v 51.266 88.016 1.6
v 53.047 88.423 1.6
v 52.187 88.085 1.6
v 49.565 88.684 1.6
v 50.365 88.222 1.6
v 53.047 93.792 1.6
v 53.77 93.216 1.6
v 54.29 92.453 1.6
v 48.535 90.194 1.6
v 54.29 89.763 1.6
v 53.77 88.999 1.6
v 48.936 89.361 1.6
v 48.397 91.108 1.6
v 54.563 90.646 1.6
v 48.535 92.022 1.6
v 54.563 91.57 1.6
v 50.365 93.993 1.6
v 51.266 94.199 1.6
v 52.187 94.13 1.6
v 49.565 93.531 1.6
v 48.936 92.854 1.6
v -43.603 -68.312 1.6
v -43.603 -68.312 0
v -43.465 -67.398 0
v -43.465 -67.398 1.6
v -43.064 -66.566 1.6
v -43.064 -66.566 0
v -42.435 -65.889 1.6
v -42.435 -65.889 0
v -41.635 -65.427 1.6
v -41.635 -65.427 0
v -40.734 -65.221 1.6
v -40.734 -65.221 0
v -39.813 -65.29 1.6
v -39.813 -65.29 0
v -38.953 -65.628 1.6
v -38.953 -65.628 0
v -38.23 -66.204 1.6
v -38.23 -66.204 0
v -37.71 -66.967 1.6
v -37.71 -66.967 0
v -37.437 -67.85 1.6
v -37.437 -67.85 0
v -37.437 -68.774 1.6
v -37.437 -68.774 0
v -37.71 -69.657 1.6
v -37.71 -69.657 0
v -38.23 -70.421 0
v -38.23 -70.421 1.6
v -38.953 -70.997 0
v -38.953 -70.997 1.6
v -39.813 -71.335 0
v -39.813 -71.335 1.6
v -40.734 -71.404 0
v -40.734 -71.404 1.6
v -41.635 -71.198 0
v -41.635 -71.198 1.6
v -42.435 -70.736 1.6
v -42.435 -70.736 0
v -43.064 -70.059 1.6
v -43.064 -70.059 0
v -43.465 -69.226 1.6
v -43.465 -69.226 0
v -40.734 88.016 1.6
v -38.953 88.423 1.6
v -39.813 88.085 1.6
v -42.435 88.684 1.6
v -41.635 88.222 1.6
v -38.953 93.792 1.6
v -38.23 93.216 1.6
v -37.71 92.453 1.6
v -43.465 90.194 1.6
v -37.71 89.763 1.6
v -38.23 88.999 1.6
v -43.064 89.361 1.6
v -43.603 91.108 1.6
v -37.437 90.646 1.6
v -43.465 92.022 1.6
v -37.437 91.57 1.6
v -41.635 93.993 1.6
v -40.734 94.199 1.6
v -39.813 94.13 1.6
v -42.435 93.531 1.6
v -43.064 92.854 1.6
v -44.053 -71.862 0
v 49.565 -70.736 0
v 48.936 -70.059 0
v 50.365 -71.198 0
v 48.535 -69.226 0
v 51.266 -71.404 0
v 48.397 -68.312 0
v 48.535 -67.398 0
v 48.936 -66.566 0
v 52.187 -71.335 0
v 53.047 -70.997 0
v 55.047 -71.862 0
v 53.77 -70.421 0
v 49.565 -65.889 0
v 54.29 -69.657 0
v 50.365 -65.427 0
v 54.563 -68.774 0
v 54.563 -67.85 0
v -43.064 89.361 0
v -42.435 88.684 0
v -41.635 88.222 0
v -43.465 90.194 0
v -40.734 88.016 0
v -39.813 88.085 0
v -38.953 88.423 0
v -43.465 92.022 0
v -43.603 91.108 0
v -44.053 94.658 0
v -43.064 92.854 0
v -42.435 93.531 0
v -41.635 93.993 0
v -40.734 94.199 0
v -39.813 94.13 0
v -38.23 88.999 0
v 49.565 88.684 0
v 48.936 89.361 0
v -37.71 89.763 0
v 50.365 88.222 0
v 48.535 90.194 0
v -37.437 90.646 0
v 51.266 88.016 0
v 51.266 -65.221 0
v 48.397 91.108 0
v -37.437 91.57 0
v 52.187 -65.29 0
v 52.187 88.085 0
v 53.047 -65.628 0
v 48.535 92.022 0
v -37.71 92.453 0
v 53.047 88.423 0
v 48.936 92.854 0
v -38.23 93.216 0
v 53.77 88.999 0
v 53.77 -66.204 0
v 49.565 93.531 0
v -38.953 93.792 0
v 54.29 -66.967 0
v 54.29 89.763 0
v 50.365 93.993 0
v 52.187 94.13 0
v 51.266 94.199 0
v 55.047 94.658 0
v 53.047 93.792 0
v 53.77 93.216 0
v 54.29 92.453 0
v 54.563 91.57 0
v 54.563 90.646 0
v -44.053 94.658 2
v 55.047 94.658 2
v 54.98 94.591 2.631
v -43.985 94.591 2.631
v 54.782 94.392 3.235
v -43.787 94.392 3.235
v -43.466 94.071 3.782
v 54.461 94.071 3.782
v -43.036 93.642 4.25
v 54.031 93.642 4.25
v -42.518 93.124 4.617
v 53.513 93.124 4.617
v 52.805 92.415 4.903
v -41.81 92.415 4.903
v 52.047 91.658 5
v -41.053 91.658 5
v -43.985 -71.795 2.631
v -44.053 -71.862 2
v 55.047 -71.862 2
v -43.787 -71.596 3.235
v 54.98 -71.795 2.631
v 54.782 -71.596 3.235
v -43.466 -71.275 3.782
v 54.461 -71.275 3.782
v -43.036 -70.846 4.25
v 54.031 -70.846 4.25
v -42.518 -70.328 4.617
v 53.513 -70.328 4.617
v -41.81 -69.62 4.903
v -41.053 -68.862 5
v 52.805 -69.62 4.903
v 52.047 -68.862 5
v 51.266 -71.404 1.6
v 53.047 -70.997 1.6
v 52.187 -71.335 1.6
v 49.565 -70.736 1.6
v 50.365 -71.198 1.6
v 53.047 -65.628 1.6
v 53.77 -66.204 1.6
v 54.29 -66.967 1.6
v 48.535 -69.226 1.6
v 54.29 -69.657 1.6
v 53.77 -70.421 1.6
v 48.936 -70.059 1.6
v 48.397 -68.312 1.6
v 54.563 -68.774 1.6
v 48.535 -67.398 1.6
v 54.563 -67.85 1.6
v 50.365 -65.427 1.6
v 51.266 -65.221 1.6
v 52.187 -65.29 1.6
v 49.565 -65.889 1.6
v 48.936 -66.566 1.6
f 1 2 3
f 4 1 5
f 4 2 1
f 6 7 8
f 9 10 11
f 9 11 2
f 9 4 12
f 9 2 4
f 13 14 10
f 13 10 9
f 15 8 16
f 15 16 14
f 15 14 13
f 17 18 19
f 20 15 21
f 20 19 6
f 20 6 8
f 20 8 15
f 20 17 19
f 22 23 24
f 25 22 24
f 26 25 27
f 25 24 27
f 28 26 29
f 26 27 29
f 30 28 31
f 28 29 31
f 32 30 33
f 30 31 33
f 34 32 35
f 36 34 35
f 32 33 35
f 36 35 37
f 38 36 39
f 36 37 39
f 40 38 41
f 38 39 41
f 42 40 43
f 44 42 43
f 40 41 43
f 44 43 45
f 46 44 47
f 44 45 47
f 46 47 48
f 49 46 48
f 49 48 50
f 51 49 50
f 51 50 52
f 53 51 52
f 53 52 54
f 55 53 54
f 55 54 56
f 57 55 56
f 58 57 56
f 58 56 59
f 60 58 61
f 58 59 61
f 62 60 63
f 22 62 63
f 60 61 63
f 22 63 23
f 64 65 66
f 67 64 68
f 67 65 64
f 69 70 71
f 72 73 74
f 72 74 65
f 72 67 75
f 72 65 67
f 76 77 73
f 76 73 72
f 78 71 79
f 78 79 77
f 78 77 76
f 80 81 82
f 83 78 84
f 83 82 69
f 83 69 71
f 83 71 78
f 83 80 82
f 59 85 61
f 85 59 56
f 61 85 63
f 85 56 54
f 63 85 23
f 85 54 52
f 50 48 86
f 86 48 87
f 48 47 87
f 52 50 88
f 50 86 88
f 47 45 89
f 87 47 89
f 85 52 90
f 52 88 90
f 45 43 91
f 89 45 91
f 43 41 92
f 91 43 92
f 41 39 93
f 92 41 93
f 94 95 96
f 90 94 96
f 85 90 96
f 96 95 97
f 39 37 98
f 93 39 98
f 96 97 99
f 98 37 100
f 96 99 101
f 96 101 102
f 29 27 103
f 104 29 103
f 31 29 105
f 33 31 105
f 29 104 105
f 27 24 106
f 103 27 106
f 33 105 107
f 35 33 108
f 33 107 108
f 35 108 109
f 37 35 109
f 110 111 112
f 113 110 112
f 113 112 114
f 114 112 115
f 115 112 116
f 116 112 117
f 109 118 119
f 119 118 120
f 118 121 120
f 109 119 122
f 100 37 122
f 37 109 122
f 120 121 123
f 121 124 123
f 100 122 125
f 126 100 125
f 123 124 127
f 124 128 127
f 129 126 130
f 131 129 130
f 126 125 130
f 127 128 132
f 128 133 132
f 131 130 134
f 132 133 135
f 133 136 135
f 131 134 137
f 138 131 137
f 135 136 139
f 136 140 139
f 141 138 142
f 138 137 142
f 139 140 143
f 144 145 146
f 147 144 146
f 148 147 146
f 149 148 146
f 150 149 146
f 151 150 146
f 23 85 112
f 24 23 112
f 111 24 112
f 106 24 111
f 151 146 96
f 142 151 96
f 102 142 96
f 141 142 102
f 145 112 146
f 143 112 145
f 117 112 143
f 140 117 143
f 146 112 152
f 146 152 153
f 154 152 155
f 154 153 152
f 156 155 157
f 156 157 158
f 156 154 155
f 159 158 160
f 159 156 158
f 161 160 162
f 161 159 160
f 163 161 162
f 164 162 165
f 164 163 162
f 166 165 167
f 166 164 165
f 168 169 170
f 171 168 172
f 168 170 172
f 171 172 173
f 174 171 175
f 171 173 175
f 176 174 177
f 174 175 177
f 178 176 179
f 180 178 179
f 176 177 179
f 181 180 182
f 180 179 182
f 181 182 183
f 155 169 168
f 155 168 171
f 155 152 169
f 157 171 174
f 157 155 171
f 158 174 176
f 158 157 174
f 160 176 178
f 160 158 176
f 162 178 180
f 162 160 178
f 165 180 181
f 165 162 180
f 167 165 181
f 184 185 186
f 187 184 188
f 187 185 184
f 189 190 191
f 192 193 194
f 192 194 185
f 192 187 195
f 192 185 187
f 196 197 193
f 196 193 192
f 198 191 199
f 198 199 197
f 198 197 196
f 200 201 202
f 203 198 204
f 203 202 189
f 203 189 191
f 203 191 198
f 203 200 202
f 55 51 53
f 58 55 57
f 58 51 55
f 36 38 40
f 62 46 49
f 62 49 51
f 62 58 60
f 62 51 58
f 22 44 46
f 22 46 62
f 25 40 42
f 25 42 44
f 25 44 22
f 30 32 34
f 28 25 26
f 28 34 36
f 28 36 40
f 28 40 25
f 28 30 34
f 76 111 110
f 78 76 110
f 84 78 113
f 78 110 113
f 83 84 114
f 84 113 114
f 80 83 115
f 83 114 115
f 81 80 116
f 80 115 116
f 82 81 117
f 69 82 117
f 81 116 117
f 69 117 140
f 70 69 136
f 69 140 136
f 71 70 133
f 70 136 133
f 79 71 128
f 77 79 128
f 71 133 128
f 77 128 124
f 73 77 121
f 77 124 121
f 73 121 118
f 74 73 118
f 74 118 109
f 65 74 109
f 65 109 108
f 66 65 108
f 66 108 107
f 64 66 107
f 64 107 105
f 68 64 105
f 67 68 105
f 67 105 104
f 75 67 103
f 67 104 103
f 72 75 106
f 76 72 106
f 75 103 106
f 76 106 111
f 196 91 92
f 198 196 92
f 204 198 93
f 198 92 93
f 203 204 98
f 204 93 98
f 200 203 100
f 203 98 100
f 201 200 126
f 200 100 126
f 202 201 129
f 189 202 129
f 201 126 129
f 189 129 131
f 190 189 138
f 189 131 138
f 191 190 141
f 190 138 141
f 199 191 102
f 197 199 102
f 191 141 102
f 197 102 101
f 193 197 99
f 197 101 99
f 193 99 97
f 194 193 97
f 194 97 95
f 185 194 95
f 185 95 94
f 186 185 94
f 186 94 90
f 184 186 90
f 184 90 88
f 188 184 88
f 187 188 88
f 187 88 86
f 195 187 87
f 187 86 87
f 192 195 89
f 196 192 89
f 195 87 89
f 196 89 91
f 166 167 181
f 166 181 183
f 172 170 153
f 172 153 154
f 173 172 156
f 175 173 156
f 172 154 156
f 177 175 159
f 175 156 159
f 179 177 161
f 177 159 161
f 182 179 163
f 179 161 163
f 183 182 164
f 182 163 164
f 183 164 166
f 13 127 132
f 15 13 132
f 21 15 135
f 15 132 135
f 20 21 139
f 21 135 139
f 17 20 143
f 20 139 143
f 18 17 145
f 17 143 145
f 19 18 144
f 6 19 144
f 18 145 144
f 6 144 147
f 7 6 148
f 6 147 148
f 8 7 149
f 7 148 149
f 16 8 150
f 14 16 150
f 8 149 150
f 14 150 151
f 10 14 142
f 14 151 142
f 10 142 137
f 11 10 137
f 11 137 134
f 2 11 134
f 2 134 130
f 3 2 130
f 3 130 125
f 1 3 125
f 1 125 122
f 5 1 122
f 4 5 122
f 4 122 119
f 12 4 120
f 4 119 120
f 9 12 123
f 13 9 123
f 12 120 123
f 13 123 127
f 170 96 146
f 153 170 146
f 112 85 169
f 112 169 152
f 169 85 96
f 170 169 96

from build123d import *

# Parameters (mm, degrees)
ESBO_O1_W                = 99.1
ESBO_O1_H                = 166.52
RESSALTO_EXTRUS_O1_DEPTH = 5
FILETE1_R                = 3
ESBO_O2_R                = 3.1
CORTE_EXTRUS_O1_DEPTH    = 1.6
ESBO_O3_R                = 3.1
CORTE_EXTRUS_O2_DEPTH    = 1.6
ESBO_O4_R                = 3.1
CORTE_EXTRUS_O3_DEPTH    = 1.6
ESBO_O5_R                = 3.1
CORTE_EXTRUS_O4_DEPTH    = 1.6


with BuildPart() as part:
    # Esboço1 → Ressalto-extrusão1 (new body)
    with BuildSketch(Plane.XY):
        with Locations((5.497464185, 11.397762804)):
            Rectangle(ESBO_O1_W, ESBO_O1_H)
    extrude(amount=RESSALTO_EXTRUS_O1_DEPTH)

    # Filete1
    filete1_edges = [part.edges().sort_by_distance(p)[0] for p in [
        (55.047464185, 11.397762804, 5),
        (5.497464185, 94.657762804, 5),
        (-44.052535815, 11.397762804, 5),
        (5.497464185, -71.862237196, 5),
    ]]
    fillet(filete1_edges, radius=FILETE1_R)

    # Esboço2 → Corte-extrusão1 (cut)
    with BuildSketch(Plane(origin=(0, 0, 0), x_dir=(-1, 0, 0), z_dir=(0, 0, -1))):
        with Locations((-51.497464185, 91.107762804)):
            Circle(ESBO_O2_R)
    extrude(amount=-CORTE_EXTRUS_O1_DEPTH, mode=Mode.SUBTRACT)

    # Esboço3 → Corte-extrusão2 (cut)
    with BuildSketch(Plane(origin=(0, 0, 0), x_dir=(-1, 0, 0), z_dir=(0, 0, -1))):
        with Locations((40.502535815, 91.107762804)):
            Circle(ESBO_O3_R)
    extrude(amount=-CORTE_EXTRUS_O2_DEPTH, mode=Mode.SUBTRACT)

    # Esboço4 → Corte-extrusão3 (cut)
    with BuildSketch(Plane(origin=(0, 0, 0), x_dir=(-1, 0, 0), z_dir=(0, 0, -1))):
        with Locations((-51.497464185, -68.312237196)):
            Circle(ESBO_O4_R)
    extrude(amount=-CORTE_EXTRUS_O3_DEPTH, mode=Mode.SUBTRACT)

    # Esboço5 → Corte-extrusão4 (cut)
    with BuildSketch(Plane(origin=(0, 0, 0), x_dir=(-1, 0, 0), z_dir=(0, 0, -1))):
        with Locations((40.502535815, -68.312237196)):
            Circle(ESBO_O5_R)
    extrude(amount=-CORTE_EXTRUS_O4_DEPTH, mode=Mode.SUBTRACT)


solid = part.part
